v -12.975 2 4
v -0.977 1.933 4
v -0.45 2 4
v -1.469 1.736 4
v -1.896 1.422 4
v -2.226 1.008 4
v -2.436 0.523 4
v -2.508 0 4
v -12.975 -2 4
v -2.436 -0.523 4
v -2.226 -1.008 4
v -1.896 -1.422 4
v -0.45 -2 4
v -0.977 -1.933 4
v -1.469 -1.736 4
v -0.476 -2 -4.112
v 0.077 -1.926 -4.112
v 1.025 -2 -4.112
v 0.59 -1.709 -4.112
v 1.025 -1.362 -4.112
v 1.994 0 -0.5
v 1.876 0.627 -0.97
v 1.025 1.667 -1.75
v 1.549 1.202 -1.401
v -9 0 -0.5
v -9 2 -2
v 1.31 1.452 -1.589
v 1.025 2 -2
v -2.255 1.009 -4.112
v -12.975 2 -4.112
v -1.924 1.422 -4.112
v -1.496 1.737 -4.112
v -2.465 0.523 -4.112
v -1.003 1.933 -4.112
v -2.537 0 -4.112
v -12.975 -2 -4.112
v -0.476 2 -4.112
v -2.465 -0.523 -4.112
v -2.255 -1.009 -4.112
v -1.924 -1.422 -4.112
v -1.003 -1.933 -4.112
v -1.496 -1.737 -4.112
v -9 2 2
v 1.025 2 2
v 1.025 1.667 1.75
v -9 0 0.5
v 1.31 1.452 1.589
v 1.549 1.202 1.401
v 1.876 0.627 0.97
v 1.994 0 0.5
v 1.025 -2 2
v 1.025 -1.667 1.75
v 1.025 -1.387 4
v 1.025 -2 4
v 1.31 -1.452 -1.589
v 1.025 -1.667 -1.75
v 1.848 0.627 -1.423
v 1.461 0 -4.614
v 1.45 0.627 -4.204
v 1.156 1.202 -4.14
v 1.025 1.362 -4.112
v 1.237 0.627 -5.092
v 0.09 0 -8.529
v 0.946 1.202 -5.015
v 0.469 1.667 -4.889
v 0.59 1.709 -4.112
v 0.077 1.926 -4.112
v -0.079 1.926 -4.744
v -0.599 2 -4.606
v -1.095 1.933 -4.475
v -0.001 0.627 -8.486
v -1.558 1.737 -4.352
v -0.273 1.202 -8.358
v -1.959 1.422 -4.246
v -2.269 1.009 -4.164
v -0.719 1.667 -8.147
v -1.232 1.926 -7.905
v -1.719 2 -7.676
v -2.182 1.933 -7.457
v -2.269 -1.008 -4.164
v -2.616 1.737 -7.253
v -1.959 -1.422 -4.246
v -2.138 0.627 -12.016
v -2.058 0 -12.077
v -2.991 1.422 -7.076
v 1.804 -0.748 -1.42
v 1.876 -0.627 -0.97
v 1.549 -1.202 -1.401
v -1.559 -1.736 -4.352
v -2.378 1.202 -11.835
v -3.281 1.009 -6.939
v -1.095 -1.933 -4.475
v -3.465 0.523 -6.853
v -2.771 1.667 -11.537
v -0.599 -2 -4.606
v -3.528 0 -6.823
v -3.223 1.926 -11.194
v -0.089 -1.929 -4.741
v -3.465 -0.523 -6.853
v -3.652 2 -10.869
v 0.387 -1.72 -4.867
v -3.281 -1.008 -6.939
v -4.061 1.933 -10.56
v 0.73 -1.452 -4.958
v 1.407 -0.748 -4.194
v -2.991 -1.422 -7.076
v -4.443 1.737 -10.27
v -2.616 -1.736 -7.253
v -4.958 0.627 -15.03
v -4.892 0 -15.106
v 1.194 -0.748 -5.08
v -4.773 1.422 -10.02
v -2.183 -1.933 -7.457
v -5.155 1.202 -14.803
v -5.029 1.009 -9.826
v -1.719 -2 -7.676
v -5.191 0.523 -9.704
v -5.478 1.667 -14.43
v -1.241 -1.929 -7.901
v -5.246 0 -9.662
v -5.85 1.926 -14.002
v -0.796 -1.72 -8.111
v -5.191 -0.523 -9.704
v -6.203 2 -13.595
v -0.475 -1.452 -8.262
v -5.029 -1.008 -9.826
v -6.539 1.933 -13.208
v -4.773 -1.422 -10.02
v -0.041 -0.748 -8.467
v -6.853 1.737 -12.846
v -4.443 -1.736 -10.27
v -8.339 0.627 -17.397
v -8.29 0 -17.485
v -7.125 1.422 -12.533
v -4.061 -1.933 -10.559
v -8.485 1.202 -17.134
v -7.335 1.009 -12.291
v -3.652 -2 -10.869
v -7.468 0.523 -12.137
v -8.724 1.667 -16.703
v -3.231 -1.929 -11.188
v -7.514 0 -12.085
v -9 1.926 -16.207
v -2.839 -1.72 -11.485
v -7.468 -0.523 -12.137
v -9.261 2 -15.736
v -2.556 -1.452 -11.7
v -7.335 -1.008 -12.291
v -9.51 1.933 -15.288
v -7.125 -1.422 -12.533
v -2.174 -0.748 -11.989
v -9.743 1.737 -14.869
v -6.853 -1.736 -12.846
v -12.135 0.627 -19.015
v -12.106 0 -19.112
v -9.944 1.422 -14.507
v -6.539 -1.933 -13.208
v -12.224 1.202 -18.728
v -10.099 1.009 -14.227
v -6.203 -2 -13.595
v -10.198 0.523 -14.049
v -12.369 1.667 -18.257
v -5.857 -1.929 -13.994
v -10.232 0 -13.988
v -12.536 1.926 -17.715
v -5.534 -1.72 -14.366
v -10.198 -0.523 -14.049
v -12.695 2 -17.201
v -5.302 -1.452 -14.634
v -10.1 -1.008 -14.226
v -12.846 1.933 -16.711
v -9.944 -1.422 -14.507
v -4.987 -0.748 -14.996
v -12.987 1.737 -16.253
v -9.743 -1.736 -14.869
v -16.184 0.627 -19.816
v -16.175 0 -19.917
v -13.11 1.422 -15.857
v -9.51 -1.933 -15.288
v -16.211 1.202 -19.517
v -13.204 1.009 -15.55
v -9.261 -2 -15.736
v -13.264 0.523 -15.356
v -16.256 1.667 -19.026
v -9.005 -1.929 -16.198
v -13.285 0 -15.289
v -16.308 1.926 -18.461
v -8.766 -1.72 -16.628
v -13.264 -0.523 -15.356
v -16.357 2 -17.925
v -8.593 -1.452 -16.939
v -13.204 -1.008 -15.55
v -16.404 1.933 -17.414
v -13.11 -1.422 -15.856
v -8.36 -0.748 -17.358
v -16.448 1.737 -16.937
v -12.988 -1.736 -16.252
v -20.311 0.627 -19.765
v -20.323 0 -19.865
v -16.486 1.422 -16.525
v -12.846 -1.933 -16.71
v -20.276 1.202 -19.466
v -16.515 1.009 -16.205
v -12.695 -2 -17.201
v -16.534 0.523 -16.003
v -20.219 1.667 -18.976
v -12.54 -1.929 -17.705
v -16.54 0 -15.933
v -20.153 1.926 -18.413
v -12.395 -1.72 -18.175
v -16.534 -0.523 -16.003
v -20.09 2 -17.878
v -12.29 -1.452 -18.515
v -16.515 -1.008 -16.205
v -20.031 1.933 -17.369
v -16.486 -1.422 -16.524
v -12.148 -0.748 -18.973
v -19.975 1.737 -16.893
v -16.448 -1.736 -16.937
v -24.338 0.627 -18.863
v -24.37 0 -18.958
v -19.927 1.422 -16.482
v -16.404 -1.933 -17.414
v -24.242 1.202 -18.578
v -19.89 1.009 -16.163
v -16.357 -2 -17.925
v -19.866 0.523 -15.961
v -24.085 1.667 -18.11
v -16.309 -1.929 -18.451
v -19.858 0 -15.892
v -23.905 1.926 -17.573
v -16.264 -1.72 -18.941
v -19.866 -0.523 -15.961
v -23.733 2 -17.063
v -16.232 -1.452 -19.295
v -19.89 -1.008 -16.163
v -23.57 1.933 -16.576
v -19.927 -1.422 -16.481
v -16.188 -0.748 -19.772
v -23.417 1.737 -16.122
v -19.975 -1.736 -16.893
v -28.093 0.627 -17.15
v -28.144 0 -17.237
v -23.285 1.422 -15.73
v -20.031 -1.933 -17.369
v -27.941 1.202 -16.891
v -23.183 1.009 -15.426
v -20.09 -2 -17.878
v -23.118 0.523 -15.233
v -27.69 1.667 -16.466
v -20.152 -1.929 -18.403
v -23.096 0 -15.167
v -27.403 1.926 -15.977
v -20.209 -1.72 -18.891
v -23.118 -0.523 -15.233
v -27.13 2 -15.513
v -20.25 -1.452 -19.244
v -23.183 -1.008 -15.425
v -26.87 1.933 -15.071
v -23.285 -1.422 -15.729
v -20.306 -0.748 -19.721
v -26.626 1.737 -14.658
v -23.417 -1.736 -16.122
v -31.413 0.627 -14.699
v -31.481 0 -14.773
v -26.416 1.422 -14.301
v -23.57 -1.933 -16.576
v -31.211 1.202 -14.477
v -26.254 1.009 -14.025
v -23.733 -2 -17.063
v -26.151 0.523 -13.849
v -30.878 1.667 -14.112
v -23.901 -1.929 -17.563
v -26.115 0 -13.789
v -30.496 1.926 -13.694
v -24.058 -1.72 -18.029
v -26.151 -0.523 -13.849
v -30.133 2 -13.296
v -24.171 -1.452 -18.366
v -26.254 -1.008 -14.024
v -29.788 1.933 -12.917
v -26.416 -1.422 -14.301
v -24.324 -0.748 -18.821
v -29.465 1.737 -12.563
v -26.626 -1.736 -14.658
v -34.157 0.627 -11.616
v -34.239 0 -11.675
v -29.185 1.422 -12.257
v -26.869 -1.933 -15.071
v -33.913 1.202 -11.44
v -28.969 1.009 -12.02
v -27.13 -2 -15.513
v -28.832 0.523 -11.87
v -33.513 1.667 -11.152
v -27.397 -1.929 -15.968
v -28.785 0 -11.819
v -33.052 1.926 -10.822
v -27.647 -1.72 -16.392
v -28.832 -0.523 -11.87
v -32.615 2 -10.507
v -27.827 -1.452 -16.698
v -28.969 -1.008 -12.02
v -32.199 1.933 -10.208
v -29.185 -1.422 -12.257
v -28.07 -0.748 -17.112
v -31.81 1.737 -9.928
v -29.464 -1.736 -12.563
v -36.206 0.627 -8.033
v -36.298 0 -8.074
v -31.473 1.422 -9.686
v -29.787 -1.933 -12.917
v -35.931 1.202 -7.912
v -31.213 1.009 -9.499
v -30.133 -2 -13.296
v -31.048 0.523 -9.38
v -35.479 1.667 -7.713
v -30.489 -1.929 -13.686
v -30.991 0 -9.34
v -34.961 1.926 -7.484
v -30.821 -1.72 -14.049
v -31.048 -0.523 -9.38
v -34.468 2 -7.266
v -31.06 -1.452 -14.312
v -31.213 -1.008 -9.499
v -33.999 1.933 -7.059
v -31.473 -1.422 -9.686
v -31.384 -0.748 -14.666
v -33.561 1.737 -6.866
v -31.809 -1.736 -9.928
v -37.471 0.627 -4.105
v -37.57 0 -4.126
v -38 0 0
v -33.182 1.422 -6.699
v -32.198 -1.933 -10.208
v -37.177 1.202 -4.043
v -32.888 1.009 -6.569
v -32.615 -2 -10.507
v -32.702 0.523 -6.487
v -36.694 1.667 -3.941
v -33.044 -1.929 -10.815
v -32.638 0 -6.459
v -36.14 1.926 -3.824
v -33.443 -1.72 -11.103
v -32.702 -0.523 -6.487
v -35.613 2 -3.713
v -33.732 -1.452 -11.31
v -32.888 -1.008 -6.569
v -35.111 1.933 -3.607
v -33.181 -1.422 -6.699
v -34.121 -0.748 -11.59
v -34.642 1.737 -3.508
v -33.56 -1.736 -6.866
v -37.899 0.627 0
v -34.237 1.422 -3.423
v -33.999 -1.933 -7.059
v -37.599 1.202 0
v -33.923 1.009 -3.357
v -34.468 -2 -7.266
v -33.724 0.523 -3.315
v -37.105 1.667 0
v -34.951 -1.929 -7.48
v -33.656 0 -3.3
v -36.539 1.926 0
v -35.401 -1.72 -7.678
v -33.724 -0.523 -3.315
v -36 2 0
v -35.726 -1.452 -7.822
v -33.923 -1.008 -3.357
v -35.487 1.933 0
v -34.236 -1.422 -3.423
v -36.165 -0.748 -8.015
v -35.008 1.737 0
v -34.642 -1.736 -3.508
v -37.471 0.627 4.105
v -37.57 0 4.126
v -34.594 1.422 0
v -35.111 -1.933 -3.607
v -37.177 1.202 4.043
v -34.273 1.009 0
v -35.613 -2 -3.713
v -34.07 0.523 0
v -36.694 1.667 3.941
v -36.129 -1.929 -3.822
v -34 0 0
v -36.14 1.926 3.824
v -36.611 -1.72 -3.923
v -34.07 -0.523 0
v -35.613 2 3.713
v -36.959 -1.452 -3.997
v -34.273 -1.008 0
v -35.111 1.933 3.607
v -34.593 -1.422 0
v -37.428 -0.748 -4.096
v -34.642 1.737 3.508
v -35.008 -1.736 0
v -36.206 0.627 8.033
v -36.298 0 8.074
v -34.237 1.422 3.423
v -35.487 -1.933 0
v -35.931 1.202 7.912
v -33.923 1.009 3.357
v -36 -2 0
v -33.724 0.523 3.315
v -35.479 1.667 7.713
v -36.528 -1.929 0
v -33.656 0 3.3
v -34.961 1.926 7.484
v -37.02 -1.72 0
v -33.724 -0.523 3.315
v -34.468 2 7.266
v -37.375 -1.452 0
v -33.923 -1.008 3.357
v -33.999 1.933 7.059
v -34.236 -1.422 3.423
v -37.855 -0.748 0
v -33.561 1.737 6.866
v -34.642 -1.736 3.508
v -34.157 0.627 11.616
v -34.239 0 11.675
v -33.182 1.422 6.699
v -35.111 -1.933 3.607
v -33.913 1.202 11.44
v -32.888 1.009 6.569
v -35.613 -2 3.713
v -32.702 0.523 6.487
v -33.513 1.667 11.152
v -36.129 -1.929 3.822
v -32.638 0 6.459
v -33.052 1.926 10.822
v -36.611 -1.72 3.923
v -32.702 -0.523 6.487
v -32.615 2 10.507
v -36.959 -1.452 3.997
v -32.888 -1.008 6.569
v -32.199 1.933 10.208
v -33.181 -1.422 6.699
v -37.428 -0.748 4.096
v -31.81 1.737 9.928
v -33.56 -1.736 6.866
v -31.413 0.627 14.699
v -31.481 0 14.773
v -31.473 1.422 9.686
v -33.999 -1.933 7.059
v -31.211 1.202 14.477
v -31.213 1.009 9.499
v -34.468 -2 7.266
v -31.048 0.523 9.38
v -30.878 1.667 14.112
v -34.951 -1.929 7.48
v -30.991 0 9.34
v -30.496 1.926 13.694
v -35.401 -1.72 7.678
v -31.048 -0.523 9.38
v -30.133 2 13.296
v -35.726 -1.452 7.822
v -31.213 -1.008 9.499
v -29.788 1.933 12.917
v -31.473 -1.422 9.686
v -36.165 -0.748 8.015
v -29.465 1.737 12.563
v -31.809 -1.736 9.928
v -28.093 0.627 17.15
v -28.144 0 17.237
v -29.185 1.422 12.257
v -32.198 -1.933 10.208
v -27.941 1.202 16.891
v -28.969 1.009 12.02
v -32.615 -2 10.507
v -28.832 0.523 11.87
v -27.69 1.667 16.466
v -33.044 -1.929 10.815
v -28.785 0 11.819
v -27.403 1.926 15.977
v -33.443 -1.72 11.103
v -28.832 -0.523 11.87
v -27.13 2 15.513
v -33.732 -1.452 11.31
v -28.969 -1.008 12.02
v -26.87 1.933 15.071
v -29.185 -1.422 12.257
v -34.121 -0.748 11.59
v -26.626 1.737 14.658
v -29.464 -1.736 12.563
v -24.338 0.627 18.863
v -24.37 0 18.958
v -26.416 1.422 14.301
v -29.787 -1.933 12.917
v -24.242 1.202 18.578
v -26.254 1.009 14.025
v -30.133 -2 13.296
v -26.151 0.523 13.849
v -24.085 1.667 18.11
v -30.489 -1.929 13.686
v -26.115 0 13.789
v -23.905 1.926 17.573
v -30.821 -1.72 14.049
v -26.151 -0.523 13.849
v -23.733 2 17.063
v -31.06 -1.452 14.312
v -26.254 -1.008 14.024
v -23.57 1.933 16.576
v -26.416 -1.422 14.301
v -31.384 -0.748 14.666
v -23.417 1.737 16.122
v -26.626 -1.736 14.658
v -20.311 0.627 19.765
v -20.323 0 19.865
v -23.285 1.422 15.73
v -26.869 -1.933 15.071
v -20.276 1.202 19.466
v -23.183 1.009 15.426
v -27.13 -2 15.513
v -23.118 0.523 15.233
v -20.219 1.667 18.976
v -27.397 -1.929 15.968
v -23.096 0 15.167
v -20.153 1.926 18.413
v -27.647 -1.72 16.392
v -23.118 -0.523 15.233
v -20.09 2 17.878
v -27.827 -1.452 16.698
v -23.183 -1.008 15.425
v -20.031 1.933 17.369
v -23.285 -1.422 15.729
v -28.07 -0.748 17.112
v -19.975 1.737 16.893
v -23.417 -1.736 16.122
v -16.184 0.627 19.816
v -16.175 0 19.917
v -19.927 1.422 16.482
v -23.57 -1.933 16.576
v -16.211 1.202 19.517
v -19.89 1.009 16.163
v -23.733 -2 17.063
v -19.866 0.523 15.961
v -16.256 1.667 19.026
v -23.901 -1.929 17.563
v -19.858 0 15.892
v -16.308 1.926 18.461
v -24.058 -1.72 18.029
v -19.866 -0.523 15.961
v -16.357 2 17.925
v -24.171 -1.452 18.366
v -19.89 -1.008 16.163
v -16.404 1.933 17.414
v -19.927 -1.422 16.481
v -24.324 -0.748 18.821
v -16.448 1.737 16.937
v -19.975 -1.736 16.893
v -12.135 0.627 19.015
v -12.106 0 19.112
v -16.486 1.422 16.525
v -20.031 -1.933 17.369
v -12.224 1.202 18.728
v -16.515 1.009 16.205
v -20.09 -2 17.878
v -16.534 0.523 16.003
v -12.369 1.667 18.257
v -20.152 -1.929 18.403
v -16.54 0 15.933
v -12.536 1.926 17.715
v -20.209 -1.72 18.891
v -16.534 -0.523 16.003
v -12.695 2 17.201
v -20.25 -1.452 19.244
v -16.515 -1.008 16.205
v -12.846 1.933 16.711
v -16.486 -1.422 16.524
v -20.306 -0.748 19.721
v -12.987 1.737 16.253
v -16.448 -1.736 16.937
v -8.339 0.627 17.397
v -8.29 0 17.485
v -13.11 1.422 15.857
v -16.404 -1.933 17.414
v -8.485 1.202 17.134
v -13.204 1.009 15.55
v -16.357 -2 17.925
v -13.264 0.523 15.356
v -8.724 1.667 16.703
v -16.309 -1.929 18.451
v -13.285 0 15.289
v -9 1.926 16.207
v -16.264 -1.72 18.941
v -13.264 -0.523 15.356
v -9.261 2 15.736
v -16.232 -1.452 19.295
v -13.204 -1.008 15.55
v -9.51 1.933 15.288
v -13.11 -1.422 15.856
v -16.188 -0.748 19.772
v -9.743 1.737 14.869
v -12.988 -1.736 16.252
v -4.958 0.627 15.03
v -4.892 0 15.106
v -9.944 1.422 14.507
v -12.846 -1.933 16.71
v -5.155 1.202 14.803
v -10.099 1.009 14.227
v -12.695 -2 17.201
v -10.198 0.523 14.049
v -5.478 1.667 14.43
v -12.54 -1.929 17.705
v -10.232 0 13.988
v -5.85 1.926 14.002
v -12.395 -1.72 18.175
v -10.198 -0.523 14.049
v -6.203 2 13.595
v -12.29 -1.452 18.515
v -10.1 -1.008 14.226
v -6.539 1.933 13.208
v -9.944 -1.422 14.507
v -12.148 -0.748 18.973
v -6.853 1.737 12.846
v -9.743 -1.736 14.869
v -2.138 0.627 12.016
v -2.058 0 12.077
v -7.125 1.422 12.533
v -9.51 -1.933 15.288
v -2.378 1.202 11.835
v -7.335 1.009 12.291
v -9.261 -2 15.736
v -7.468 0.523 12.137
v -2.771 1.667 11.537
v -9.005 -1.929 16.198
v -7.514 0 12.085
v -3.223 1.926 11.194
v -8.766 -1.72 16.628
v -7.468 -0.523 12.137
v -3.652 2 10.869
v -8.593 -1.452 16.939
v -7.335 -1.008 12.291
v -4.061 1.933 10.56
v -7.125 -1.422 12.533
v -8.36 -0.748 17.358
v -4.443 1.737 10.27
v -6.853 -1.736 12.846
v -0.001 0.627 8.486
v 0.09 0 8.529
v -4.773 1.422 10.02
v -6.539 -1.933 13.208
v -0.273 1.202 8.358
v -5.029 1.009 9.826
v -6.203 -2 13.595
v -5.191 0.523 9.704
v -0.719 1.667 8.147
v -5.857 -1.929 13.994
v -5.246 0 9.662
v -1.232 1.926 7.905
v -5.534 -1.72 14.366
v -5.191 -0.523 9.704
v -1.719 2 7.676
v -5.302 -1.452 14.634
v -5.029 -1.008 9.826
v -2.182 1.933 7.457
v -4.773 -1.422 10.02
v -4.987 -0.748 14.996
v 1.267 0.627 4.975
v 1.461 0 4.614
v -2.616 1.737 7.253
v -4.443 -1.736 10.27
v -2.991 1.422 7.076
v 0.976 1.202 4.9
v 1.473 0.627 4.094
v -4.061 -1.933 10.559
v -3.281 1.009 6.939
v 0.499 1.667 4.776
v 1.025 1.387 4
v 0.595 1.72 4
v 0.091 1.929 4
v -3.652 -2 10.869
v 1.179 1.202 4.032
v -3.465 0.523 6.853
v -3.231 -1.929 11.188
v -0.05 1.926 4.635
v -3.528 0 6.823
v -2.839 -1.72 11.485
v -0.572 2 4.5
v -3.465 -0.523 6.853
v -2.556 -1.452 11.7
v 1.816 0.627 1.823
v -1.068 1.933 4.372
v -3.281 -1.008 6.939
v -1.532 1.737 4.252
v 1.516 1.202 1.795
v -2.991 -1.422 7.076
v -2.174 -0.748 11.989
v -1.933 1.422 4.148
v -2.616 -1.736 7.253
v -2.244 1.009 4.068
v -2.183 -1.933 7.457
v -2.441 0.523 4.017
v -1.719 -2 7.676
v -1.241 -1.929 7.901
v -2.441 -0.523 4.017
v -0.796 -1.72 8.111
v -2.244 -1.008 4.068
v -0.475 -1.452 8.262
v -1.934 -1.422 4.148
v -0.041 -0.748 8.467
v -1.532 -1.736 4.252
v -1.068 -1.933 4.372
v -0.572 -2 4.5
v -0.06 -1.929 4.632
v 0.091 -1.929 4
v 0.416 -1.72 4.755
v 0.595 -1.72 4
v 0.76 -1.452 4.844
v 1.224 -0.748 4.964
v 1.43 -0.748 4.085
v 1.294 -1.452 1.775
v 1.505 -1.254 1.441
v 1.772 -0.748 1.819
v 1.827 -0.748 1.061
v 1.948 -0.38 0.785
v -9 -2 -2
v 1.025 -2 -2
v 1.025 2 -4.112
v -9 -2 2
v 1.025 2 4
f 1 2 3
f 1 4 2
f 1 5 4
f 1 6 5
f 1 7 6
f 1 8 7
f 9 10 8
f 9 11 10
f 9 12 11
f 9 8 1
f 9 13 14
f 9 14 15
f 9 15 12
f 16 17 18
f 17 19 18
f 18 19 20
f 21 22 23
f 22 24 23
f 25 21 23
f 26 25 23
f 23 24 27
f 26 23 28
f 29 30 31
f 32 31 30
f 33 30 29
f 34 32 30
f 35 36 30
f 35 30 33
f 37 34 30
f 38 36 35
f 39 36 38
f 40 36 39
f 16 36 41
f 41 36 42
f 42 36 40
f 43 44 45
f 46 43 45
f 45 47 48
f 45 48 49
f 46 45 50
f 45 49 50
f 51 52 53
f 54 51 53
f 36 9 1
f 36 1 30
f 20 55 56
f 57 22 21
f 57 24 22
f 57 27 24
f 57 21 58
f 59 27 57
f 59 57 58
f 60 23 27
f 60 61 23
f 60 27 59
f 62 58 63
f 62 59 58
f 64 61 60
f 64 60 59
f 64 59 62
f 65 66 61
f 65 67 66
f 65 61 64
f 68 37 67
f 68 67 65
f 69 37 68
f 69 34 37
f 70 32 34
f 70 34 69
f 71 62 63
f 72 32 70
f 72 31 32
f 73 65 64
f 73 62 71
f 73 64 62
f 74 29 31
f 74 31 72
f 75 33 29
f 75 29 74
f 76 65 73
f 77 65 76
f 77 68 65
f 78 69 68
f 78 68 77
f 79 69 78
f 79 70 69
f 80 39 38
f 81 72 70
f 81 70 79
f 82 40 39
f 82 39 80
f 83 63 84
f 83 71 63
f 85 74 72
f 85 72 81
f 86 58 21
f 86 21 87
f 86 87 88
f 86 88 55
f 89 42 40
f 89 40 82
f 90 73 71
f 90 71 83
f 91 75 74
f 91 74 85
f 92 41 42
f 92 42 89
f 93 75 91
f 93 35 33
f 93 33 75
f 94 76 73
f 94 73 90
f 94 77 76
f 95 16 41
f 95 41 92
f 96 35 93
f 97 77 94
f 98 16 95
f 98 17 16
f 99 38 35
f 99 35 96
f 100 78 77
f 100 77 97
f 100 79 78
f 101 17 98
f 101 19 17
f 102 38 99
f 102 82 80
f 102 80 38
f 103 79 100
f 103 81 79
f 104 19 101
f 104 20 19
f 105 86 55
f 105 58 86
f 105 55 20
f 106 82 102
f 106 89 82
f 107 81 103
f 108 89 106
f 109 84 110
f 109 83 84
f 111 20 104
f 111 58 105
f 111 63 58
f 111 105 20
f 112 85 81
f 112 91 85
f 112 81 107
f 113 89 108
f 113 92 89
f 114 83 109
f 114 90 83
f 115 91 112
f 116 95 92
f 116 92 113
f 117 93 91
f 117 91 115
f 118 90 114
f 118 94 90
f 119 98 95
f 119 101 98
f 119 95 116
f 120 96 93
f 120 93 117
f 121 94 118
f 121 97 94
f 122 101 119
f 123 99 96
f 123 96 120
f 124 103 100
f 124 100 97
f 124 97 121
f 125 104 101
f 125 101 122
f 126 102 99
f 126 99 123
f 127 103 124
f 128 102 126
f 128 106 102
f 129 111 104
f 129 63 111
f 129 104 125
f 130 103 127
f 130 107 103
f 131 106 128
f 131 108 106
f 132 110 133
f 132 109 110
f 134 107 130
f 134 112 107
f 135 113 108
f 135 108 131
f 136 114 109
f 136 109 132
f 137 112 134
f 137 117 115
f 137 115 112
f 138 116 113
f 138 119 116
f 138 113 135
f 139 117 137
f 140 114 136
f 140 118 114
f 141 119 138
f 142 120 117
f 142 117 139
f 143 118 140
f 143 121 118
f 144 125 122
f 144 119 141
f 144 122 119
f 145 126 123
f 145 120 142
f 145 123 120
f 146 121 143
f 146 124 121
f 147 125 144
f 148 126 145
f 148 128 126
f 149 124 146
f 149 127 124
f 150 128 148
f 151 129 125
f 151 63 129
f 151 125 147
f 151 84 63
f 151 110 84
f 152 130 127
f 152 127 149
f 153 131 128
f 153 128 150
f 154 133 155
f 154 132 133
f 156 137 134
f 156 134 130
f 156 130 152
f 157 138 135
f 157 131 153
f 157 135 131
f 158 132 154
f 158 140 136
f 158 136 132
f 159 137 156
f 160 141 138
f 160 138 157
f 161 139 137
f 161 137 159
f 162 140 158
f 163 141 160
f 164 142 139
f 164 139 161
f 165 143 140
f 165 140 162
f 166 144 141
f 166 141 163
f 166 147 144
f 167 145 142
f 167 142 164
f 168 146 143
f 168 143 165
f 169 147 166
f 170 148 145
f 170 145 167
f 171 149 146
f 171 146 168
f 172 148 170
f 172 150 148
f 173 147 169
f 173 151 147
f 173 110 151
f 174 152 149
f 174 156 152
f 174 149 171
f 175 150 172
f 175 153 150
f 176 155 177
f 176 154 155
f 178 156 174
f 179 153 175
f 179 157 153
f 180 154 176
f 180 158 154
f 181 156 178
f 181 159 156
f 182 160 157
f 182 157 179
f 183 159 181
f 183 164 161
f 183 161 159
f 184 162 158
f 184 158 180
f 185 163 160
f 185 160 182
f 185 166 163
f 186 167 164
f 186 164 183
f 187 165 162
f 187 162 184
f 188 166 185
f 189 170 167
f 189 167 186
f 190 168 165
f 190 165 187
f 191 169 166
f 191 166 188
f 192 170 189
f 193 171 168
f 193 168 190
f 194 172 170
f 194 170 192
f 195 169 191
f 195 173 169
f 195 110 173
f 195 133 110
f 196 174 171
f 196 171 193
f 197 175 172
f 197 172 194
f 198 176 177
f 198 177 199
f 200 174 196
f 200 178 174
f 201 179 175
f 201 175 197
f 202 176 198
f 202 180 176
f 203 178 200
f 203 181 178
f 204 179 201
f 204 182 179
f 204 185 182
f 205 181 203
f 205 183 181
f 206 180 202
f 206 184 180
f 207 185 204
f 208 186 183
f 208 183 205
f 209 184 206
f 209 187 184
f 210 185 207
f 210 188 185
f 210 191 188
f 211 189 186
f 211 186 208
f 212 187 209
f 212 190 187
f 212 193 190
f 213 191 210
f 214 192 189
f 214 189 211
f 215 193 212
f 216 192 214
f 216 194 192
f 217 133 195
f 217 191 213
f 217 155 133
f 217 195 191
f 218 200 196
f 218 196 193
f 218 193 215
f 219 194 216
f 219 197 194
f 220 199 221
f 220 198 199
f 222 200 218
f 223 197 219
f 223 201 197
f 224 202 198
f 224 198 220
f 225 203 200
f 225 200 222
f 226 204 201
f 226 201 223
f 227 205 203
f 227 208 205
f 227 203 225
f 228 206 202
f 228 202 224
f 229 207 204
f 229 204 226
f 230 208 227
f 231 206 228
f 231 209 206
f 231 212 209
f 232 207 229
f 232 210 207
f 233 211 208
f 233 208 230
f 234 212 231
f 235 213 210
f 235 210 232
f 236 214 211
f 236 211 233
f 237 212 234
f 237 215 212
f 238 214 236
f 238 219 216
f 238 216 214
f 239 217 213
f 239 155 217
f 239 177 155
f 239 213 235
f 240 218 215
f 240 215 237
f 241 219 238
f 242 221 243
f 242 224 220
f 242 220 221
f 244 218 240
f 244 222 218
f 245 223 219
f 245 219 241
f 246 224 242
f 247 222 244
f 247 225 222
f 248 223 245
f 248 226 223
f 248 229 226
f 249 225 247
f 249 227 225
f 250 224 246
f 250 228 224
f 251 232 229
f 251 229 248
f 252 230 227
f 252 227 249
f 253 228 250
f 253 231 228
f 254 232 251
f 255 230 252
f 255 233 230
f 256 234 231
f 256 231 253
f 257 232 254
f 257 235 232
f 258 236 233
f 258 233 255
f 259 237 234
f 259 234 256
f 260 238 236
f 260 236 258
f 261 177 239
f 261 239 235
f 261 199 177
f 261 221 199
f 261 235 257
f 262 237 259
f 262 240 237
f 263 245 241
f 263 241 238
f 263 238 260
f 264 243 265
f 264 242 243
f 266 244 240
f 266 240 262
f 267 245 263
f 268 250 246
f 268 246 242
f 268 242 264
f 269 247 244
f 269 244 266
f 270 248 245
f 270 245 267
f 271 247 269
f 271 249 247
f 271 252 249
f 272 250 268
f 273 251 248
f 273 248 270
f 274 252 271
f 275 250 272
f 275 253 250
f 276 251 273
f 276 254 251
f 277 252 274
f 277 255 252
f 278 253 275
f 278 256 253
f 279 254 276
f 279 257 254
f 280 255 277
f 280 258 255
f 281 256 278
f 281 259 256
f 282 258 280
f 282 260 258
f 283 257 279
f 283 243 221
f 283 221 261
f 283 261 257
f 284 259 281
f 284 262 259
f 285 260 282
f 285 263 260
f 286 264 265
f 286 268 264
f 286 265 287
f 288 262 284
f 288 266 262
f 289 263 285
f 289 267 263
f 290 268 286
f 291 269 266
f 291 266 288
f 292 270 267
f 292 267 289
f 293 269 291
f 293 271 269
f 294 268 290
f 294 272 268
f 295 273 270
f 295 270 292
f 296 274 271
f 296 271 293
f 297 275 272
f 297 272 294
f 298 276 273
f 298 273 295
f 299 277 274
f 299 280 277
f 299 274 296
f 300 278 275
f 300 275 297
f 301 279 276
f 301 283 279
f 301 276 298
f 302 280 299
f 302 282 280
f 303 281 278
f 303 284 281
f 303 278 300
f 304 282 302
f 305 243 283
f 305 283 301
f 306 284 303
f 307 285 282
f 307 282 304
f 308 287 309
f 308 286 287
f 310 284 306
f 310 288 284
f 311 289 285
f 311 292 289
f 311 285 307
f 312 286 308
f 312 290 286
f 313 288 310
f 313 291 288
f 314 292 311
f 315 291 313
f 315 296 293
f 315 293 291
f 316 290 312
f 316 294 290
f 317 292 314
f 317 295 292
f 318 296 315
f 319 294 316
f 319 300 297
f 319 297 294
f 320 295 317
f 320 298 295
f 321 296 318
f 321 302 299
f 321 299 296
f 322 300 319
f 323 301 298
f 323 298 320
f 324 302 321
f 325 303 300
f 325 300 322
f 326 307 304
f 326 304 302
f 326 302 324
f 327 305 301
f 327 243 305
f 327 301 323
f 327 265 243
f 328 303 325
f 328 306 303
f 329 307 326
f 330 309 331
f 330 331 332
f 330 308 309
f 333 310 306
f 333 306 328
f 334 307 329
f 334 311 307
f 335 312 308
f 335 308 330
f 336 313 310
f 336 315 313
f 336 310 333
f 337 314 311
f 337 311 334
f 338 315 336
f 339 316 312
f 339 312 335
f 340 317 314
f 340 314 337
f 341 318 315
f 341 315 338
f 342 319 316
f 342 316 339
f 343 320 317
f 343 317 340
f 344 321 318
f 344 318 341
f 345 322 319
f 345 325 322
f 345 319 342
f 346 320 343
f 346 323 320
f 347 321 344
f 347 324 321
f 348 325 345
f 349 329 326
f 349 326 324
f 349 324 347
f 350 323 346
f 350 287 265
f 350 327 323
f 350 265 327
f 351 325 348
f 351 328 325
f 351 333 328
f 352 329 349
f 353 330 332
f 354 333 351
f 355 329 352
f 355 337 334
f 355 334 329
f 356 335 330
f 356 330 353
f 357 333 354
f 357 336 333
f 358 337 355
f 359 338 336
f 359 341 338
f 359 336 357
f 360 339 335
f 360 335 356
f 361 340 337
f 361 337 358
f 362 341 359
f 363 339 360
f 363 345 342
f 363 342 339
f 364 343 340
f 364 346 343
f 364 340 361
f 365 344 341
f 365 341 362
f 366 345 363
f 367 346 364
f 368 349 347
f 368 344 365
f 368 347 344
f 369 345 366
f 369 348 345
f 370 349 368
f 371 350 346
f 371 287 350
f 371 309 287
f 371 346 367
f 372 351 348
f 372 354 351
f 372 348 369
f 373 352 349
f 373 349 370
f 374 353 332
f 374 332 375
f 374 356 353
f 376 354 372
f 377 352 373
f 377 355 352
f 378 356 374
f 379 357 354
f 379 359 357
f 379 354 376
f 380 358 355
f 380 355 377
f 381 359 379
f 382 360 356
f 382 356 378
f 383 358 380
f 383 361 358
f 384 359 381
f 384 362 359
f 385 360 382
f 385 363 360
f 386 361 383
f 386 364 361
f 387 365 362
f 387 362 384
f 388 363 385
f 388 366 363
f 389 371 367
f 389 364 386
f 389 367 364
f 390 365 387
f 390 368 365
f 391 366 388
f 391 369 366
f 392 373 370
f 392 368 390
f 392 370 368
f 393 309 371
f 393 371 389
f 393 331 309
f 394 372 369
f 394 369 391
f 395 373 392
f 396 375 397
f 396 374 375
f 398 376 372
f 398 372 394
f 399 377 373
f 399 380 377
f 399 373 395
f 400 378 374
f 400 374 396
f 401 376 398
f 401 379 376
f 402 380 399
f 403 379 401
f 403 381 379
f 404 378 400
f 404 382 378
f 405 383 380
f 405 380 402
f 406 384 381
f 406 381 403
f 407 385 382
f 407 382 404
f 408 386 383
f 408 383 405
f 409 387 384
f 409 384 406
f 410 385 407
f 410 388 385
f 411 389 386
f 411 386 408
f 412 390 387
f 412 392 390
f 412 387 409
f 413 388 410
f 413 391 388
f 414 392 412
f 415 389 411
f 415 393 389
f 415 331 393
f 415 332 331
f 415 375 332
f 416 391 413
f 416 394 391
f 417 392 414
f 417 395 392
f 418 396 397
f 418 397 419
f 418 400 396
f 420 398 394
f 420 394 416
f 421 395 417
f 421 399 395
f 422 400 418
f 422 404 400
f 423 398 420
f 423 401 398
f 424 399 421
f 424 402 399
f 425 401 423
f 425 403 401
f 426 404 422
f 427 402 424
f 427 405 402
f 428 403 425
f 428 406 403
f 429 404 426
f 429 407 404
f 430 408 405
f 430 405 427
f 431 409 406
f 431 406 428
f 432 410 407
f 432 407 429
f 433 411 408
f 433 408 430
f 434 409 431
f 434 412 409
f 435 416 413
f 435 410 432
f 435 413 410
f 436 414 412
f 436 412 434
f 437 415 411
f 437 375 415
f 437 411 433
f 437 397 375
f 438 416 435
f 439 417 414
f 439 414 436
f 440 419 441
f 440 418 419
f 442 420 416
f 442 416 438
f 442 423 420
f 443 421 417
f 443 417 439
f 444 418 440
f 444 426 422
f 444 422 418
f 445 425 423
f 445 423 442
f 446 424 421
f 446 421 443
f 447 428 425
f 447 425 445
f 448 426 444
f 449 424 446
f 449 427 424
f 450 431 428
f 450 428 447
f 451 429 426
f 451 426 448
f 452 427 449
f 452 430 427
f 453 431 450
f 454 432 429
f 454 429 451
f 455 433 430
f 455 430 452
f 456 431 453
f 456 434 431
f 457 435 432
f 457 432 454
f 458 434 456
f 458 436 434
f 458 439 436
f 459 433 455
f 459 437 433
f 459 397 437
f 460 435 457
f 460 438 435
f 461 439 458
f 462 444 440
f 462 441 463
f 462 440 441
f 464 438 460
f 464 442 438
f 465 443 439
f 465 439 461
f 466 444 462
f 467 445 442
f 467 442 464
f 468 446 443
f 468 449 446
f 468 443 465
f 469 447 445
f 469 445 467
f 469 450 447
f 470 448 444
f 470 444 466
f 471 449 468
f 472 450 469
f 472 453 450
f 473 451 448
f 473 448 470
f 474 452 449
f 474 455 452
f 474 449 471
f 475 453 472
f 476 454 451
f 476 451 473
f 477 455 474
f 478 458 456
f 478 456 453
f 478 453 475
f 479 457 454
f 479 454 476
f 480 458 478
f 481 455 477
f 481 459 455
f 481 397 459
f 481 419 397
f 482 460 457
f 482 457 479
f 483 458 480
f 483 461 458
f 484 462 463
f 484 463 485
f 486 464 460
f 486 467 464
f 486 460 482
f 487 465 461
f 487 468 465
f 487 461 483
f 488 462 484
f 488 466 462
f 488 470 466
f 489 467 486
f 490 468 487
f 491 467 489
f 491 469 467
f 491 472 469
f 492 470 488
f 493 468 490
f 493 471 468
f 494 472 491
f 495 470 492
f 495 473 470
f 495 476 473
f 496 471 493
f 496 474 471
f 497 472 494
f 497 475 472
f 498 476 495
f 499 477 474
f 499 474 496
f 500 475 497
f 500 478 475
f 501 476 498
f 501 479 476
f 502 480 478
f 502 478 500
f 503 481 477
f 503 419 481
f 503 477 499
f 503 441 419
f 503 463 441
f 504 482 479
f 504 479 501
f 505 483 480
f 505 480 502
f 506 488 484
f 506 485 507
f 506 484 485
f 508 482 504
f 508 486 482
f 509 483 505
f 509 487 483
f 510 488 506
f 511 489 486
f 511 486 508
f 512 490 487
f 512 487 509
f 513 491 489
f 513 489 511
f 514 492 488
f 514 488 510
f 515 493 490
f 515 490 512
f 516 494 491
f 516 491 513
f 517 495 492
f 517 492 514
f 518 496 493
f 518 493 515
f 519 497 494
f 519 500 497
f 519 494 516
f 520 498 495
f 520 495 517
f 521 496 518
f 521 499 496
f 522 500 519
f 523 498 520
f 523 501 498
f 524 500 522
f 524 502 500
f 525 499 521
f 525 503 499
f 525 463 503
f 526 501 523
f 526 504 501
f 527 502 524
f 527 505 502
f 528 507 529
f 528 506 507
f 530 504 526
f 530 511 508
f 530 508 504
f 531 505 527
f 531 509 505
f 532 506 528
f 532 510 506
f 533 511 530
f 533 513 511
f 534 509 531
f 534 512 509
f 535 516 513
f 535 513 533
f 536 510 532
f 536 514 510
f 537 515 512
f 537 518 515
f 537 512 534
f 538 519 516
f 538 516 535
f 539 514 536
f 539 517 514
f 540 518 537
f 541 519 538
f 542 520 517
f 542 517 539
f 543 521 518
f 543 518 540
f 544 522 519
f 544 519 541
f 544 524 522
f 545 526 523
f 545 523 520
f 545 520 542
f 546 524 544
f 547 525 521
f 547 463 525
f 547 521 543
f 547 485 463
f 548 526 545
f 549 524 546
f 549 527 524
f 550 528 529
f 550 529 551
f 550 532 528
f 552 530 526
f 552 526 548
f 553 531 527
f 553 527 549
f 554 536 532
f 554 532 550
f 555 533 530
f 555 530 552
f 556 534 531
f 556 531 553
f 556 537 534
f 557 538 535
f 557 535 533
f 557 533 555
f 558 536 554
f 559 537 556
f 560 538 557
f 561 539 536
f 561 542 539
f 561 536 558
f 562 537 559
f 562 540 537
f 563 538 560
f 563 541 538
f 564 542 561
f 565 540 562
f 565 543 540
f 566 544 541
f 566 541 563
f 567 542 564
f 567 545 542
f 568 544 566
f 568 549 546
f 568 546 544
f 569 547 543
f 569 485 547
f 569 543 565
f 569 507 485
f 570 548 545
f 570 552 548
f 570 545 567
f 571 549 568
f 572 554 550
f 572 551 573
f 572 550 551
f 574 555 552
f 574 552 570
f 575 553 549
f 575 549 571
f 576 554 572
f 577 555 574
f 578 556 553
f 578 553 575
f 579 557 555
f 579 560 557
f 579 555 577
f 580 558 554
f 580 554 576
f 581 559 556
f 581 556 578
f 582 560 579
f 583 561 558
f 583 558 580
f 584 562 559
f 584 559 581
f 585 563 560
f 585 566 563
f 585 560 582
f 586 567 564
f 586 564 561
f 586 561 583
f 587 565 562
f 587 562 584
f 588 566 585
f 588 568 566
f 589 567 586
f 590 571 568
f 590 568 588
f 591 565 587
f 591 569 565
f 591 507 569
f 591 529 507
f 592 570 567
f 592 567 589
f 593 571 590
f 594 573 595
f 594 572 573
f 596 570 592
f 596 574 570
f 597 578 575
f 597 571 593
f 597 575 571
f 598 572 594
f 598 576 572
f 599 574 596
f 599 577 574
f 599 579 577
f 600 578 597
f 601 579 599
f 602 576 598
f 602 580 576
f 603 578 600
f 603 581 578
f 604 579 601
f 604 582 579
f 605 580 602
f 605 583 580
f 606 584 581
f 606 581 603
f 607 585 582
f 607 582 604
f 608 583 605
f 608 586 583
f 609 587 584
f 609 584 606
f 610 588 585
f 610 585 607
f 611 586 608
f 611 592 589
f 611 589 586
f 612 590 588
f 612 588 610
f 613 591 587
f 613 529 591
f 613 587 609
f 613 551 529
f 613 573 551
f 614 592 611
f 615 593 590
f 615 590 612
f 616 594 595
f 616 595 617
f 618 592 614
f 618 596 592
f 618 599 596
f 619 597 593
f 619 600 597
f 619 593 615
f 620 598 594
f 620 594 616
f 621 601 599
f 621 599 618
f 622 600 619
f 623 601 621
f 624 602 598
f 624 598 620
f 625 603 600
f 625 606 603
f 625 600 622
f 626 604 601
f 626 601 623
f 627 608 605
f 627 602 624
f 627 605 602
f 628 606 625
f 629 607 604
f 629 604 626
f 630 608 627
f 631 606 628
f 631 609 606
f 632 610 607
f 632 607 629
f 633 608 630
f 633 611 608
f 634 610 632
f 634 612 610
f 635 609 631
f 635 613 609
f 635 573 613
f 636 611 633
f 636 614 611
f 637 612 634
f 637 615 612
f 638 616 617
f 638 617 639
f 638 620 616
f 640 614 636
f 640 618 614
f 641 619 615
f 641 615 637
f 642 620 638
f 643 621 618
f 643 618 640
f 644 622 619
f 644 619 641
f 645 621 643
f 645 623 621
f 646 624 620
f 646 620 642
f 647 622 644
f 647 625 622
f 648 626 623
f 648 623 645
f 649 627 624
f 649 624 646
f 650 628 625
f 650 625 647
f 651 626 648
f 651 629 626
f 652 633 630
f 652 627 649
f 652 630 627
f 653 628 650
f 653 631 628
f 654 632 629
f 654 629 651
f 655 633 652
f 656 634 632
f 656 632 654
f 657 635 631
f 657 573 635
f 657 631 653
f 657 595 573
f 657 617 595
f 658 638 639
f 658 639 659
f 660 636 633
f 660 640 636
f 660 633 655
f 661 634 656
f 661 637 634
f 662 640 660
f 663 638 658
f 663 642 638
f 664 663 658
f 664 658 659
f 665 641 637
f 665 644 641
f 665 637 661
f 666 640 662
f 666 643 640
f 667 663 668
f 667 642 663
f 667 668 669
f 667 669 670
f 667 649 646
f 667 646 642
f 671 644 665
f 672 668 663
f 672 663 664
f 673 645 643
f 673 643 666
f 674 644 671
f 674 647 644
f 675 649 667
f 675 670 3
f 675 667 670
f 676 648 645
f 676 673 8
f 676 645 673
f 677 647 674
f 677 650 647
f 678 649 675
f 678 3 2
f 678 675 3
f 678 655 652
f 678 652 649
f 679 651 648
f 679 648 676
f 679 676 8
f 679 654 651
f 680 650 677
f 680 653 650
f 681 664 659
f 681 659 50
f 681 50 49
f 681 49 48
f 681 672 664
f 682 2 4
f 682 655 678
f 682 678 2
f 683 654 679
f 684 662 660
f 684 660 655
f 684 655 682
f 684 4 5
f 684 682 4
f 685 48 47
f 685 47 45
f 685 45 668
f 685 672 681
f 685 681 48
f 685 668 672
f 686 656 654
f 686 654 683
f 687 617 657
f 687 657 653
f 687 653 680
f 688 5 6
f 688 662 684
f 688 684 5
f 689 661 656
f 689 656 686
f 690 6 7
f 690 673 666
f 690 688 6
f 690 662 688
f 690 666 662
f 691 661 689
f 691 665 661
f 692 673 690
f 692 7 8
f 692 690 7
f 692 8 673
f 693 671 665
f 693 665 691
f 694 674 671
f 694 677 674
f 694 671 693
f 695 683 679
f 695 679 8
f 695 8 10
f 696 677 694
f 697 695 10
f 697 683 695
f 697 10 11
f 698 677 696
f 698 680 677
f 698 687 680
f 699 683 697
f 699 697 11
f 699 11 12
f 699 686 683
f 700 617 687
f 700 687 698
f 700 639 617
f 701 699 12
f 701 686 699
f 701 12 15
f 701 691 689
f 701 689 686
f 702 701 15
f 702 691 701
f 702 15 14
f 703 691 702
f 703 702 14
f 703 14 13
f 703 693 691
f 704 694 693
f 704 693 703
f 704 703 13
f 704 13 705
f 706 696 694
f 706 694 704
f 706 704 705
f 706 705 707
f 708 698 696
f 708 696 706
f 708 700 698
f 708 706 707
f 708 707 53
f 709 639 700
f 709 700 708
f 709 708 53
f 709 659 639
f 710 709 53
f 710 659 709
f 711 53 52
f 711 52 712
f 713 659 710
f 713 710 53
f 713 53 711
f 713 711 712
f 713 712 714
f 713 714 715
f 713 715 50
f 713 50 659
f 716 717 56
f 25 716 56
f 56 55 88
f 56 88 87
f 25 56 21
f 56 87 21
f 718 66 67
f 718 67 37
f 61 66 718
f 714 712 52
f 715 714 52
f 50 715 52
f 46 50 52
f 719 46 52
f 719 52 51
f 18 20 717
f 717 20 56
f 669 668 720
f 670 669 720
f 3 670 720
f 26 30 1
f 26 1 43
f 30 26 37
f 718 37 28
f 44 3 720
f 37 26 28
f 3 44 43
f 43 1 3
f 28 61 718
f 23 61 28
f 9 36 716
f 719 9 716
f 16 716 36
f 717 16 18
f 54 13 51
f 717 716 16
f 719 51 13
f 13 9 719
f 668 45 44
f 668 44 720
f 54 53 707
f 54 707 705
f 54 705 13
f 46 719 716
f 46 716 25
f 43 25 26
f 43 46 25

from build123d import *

# Parameters (mm, degrees)
F0_R          = 2
F3_DEPTH      = 2
F3_DEPTH_BACK = 2
F6_DEPTH      = 34


with BuildPart() as f1:
    # F0 (on Top) → F1 (revolve)
    with BuildSketch(Plane.XY):
        Circle(F0_R)
    revolve(axis=Axis((-18, 1.301999, 0), (0, 1, 0)))

    # F2 (on Front) → F3 (join, two sides)
    with BuildSketch(Plane.XZ) as f3_sk:
        Polygon((1.025022, 4), (-12.974978, 4), (-12.974978, -4), (-12.974978, -4.111864), (1.025022, -4.111864), align=None)
    extrude(amount=F3_DEPTH)
    extrude(f3_sk.sketch, amount=-F3_DEPTH_BACK)

    # F5 (on offset) → F6 (cut)
    with BuildSketch(Plane.YZ.offset(25)):
        Polygon((0, 0.5), (-2, 2), (-2, -2), (0, -0.5), (2, -2), (2, 2), align=None)
    extrude(amount=-F6_DEPTH, mode=Mode.SUBTRACT)


solid = f1.part
